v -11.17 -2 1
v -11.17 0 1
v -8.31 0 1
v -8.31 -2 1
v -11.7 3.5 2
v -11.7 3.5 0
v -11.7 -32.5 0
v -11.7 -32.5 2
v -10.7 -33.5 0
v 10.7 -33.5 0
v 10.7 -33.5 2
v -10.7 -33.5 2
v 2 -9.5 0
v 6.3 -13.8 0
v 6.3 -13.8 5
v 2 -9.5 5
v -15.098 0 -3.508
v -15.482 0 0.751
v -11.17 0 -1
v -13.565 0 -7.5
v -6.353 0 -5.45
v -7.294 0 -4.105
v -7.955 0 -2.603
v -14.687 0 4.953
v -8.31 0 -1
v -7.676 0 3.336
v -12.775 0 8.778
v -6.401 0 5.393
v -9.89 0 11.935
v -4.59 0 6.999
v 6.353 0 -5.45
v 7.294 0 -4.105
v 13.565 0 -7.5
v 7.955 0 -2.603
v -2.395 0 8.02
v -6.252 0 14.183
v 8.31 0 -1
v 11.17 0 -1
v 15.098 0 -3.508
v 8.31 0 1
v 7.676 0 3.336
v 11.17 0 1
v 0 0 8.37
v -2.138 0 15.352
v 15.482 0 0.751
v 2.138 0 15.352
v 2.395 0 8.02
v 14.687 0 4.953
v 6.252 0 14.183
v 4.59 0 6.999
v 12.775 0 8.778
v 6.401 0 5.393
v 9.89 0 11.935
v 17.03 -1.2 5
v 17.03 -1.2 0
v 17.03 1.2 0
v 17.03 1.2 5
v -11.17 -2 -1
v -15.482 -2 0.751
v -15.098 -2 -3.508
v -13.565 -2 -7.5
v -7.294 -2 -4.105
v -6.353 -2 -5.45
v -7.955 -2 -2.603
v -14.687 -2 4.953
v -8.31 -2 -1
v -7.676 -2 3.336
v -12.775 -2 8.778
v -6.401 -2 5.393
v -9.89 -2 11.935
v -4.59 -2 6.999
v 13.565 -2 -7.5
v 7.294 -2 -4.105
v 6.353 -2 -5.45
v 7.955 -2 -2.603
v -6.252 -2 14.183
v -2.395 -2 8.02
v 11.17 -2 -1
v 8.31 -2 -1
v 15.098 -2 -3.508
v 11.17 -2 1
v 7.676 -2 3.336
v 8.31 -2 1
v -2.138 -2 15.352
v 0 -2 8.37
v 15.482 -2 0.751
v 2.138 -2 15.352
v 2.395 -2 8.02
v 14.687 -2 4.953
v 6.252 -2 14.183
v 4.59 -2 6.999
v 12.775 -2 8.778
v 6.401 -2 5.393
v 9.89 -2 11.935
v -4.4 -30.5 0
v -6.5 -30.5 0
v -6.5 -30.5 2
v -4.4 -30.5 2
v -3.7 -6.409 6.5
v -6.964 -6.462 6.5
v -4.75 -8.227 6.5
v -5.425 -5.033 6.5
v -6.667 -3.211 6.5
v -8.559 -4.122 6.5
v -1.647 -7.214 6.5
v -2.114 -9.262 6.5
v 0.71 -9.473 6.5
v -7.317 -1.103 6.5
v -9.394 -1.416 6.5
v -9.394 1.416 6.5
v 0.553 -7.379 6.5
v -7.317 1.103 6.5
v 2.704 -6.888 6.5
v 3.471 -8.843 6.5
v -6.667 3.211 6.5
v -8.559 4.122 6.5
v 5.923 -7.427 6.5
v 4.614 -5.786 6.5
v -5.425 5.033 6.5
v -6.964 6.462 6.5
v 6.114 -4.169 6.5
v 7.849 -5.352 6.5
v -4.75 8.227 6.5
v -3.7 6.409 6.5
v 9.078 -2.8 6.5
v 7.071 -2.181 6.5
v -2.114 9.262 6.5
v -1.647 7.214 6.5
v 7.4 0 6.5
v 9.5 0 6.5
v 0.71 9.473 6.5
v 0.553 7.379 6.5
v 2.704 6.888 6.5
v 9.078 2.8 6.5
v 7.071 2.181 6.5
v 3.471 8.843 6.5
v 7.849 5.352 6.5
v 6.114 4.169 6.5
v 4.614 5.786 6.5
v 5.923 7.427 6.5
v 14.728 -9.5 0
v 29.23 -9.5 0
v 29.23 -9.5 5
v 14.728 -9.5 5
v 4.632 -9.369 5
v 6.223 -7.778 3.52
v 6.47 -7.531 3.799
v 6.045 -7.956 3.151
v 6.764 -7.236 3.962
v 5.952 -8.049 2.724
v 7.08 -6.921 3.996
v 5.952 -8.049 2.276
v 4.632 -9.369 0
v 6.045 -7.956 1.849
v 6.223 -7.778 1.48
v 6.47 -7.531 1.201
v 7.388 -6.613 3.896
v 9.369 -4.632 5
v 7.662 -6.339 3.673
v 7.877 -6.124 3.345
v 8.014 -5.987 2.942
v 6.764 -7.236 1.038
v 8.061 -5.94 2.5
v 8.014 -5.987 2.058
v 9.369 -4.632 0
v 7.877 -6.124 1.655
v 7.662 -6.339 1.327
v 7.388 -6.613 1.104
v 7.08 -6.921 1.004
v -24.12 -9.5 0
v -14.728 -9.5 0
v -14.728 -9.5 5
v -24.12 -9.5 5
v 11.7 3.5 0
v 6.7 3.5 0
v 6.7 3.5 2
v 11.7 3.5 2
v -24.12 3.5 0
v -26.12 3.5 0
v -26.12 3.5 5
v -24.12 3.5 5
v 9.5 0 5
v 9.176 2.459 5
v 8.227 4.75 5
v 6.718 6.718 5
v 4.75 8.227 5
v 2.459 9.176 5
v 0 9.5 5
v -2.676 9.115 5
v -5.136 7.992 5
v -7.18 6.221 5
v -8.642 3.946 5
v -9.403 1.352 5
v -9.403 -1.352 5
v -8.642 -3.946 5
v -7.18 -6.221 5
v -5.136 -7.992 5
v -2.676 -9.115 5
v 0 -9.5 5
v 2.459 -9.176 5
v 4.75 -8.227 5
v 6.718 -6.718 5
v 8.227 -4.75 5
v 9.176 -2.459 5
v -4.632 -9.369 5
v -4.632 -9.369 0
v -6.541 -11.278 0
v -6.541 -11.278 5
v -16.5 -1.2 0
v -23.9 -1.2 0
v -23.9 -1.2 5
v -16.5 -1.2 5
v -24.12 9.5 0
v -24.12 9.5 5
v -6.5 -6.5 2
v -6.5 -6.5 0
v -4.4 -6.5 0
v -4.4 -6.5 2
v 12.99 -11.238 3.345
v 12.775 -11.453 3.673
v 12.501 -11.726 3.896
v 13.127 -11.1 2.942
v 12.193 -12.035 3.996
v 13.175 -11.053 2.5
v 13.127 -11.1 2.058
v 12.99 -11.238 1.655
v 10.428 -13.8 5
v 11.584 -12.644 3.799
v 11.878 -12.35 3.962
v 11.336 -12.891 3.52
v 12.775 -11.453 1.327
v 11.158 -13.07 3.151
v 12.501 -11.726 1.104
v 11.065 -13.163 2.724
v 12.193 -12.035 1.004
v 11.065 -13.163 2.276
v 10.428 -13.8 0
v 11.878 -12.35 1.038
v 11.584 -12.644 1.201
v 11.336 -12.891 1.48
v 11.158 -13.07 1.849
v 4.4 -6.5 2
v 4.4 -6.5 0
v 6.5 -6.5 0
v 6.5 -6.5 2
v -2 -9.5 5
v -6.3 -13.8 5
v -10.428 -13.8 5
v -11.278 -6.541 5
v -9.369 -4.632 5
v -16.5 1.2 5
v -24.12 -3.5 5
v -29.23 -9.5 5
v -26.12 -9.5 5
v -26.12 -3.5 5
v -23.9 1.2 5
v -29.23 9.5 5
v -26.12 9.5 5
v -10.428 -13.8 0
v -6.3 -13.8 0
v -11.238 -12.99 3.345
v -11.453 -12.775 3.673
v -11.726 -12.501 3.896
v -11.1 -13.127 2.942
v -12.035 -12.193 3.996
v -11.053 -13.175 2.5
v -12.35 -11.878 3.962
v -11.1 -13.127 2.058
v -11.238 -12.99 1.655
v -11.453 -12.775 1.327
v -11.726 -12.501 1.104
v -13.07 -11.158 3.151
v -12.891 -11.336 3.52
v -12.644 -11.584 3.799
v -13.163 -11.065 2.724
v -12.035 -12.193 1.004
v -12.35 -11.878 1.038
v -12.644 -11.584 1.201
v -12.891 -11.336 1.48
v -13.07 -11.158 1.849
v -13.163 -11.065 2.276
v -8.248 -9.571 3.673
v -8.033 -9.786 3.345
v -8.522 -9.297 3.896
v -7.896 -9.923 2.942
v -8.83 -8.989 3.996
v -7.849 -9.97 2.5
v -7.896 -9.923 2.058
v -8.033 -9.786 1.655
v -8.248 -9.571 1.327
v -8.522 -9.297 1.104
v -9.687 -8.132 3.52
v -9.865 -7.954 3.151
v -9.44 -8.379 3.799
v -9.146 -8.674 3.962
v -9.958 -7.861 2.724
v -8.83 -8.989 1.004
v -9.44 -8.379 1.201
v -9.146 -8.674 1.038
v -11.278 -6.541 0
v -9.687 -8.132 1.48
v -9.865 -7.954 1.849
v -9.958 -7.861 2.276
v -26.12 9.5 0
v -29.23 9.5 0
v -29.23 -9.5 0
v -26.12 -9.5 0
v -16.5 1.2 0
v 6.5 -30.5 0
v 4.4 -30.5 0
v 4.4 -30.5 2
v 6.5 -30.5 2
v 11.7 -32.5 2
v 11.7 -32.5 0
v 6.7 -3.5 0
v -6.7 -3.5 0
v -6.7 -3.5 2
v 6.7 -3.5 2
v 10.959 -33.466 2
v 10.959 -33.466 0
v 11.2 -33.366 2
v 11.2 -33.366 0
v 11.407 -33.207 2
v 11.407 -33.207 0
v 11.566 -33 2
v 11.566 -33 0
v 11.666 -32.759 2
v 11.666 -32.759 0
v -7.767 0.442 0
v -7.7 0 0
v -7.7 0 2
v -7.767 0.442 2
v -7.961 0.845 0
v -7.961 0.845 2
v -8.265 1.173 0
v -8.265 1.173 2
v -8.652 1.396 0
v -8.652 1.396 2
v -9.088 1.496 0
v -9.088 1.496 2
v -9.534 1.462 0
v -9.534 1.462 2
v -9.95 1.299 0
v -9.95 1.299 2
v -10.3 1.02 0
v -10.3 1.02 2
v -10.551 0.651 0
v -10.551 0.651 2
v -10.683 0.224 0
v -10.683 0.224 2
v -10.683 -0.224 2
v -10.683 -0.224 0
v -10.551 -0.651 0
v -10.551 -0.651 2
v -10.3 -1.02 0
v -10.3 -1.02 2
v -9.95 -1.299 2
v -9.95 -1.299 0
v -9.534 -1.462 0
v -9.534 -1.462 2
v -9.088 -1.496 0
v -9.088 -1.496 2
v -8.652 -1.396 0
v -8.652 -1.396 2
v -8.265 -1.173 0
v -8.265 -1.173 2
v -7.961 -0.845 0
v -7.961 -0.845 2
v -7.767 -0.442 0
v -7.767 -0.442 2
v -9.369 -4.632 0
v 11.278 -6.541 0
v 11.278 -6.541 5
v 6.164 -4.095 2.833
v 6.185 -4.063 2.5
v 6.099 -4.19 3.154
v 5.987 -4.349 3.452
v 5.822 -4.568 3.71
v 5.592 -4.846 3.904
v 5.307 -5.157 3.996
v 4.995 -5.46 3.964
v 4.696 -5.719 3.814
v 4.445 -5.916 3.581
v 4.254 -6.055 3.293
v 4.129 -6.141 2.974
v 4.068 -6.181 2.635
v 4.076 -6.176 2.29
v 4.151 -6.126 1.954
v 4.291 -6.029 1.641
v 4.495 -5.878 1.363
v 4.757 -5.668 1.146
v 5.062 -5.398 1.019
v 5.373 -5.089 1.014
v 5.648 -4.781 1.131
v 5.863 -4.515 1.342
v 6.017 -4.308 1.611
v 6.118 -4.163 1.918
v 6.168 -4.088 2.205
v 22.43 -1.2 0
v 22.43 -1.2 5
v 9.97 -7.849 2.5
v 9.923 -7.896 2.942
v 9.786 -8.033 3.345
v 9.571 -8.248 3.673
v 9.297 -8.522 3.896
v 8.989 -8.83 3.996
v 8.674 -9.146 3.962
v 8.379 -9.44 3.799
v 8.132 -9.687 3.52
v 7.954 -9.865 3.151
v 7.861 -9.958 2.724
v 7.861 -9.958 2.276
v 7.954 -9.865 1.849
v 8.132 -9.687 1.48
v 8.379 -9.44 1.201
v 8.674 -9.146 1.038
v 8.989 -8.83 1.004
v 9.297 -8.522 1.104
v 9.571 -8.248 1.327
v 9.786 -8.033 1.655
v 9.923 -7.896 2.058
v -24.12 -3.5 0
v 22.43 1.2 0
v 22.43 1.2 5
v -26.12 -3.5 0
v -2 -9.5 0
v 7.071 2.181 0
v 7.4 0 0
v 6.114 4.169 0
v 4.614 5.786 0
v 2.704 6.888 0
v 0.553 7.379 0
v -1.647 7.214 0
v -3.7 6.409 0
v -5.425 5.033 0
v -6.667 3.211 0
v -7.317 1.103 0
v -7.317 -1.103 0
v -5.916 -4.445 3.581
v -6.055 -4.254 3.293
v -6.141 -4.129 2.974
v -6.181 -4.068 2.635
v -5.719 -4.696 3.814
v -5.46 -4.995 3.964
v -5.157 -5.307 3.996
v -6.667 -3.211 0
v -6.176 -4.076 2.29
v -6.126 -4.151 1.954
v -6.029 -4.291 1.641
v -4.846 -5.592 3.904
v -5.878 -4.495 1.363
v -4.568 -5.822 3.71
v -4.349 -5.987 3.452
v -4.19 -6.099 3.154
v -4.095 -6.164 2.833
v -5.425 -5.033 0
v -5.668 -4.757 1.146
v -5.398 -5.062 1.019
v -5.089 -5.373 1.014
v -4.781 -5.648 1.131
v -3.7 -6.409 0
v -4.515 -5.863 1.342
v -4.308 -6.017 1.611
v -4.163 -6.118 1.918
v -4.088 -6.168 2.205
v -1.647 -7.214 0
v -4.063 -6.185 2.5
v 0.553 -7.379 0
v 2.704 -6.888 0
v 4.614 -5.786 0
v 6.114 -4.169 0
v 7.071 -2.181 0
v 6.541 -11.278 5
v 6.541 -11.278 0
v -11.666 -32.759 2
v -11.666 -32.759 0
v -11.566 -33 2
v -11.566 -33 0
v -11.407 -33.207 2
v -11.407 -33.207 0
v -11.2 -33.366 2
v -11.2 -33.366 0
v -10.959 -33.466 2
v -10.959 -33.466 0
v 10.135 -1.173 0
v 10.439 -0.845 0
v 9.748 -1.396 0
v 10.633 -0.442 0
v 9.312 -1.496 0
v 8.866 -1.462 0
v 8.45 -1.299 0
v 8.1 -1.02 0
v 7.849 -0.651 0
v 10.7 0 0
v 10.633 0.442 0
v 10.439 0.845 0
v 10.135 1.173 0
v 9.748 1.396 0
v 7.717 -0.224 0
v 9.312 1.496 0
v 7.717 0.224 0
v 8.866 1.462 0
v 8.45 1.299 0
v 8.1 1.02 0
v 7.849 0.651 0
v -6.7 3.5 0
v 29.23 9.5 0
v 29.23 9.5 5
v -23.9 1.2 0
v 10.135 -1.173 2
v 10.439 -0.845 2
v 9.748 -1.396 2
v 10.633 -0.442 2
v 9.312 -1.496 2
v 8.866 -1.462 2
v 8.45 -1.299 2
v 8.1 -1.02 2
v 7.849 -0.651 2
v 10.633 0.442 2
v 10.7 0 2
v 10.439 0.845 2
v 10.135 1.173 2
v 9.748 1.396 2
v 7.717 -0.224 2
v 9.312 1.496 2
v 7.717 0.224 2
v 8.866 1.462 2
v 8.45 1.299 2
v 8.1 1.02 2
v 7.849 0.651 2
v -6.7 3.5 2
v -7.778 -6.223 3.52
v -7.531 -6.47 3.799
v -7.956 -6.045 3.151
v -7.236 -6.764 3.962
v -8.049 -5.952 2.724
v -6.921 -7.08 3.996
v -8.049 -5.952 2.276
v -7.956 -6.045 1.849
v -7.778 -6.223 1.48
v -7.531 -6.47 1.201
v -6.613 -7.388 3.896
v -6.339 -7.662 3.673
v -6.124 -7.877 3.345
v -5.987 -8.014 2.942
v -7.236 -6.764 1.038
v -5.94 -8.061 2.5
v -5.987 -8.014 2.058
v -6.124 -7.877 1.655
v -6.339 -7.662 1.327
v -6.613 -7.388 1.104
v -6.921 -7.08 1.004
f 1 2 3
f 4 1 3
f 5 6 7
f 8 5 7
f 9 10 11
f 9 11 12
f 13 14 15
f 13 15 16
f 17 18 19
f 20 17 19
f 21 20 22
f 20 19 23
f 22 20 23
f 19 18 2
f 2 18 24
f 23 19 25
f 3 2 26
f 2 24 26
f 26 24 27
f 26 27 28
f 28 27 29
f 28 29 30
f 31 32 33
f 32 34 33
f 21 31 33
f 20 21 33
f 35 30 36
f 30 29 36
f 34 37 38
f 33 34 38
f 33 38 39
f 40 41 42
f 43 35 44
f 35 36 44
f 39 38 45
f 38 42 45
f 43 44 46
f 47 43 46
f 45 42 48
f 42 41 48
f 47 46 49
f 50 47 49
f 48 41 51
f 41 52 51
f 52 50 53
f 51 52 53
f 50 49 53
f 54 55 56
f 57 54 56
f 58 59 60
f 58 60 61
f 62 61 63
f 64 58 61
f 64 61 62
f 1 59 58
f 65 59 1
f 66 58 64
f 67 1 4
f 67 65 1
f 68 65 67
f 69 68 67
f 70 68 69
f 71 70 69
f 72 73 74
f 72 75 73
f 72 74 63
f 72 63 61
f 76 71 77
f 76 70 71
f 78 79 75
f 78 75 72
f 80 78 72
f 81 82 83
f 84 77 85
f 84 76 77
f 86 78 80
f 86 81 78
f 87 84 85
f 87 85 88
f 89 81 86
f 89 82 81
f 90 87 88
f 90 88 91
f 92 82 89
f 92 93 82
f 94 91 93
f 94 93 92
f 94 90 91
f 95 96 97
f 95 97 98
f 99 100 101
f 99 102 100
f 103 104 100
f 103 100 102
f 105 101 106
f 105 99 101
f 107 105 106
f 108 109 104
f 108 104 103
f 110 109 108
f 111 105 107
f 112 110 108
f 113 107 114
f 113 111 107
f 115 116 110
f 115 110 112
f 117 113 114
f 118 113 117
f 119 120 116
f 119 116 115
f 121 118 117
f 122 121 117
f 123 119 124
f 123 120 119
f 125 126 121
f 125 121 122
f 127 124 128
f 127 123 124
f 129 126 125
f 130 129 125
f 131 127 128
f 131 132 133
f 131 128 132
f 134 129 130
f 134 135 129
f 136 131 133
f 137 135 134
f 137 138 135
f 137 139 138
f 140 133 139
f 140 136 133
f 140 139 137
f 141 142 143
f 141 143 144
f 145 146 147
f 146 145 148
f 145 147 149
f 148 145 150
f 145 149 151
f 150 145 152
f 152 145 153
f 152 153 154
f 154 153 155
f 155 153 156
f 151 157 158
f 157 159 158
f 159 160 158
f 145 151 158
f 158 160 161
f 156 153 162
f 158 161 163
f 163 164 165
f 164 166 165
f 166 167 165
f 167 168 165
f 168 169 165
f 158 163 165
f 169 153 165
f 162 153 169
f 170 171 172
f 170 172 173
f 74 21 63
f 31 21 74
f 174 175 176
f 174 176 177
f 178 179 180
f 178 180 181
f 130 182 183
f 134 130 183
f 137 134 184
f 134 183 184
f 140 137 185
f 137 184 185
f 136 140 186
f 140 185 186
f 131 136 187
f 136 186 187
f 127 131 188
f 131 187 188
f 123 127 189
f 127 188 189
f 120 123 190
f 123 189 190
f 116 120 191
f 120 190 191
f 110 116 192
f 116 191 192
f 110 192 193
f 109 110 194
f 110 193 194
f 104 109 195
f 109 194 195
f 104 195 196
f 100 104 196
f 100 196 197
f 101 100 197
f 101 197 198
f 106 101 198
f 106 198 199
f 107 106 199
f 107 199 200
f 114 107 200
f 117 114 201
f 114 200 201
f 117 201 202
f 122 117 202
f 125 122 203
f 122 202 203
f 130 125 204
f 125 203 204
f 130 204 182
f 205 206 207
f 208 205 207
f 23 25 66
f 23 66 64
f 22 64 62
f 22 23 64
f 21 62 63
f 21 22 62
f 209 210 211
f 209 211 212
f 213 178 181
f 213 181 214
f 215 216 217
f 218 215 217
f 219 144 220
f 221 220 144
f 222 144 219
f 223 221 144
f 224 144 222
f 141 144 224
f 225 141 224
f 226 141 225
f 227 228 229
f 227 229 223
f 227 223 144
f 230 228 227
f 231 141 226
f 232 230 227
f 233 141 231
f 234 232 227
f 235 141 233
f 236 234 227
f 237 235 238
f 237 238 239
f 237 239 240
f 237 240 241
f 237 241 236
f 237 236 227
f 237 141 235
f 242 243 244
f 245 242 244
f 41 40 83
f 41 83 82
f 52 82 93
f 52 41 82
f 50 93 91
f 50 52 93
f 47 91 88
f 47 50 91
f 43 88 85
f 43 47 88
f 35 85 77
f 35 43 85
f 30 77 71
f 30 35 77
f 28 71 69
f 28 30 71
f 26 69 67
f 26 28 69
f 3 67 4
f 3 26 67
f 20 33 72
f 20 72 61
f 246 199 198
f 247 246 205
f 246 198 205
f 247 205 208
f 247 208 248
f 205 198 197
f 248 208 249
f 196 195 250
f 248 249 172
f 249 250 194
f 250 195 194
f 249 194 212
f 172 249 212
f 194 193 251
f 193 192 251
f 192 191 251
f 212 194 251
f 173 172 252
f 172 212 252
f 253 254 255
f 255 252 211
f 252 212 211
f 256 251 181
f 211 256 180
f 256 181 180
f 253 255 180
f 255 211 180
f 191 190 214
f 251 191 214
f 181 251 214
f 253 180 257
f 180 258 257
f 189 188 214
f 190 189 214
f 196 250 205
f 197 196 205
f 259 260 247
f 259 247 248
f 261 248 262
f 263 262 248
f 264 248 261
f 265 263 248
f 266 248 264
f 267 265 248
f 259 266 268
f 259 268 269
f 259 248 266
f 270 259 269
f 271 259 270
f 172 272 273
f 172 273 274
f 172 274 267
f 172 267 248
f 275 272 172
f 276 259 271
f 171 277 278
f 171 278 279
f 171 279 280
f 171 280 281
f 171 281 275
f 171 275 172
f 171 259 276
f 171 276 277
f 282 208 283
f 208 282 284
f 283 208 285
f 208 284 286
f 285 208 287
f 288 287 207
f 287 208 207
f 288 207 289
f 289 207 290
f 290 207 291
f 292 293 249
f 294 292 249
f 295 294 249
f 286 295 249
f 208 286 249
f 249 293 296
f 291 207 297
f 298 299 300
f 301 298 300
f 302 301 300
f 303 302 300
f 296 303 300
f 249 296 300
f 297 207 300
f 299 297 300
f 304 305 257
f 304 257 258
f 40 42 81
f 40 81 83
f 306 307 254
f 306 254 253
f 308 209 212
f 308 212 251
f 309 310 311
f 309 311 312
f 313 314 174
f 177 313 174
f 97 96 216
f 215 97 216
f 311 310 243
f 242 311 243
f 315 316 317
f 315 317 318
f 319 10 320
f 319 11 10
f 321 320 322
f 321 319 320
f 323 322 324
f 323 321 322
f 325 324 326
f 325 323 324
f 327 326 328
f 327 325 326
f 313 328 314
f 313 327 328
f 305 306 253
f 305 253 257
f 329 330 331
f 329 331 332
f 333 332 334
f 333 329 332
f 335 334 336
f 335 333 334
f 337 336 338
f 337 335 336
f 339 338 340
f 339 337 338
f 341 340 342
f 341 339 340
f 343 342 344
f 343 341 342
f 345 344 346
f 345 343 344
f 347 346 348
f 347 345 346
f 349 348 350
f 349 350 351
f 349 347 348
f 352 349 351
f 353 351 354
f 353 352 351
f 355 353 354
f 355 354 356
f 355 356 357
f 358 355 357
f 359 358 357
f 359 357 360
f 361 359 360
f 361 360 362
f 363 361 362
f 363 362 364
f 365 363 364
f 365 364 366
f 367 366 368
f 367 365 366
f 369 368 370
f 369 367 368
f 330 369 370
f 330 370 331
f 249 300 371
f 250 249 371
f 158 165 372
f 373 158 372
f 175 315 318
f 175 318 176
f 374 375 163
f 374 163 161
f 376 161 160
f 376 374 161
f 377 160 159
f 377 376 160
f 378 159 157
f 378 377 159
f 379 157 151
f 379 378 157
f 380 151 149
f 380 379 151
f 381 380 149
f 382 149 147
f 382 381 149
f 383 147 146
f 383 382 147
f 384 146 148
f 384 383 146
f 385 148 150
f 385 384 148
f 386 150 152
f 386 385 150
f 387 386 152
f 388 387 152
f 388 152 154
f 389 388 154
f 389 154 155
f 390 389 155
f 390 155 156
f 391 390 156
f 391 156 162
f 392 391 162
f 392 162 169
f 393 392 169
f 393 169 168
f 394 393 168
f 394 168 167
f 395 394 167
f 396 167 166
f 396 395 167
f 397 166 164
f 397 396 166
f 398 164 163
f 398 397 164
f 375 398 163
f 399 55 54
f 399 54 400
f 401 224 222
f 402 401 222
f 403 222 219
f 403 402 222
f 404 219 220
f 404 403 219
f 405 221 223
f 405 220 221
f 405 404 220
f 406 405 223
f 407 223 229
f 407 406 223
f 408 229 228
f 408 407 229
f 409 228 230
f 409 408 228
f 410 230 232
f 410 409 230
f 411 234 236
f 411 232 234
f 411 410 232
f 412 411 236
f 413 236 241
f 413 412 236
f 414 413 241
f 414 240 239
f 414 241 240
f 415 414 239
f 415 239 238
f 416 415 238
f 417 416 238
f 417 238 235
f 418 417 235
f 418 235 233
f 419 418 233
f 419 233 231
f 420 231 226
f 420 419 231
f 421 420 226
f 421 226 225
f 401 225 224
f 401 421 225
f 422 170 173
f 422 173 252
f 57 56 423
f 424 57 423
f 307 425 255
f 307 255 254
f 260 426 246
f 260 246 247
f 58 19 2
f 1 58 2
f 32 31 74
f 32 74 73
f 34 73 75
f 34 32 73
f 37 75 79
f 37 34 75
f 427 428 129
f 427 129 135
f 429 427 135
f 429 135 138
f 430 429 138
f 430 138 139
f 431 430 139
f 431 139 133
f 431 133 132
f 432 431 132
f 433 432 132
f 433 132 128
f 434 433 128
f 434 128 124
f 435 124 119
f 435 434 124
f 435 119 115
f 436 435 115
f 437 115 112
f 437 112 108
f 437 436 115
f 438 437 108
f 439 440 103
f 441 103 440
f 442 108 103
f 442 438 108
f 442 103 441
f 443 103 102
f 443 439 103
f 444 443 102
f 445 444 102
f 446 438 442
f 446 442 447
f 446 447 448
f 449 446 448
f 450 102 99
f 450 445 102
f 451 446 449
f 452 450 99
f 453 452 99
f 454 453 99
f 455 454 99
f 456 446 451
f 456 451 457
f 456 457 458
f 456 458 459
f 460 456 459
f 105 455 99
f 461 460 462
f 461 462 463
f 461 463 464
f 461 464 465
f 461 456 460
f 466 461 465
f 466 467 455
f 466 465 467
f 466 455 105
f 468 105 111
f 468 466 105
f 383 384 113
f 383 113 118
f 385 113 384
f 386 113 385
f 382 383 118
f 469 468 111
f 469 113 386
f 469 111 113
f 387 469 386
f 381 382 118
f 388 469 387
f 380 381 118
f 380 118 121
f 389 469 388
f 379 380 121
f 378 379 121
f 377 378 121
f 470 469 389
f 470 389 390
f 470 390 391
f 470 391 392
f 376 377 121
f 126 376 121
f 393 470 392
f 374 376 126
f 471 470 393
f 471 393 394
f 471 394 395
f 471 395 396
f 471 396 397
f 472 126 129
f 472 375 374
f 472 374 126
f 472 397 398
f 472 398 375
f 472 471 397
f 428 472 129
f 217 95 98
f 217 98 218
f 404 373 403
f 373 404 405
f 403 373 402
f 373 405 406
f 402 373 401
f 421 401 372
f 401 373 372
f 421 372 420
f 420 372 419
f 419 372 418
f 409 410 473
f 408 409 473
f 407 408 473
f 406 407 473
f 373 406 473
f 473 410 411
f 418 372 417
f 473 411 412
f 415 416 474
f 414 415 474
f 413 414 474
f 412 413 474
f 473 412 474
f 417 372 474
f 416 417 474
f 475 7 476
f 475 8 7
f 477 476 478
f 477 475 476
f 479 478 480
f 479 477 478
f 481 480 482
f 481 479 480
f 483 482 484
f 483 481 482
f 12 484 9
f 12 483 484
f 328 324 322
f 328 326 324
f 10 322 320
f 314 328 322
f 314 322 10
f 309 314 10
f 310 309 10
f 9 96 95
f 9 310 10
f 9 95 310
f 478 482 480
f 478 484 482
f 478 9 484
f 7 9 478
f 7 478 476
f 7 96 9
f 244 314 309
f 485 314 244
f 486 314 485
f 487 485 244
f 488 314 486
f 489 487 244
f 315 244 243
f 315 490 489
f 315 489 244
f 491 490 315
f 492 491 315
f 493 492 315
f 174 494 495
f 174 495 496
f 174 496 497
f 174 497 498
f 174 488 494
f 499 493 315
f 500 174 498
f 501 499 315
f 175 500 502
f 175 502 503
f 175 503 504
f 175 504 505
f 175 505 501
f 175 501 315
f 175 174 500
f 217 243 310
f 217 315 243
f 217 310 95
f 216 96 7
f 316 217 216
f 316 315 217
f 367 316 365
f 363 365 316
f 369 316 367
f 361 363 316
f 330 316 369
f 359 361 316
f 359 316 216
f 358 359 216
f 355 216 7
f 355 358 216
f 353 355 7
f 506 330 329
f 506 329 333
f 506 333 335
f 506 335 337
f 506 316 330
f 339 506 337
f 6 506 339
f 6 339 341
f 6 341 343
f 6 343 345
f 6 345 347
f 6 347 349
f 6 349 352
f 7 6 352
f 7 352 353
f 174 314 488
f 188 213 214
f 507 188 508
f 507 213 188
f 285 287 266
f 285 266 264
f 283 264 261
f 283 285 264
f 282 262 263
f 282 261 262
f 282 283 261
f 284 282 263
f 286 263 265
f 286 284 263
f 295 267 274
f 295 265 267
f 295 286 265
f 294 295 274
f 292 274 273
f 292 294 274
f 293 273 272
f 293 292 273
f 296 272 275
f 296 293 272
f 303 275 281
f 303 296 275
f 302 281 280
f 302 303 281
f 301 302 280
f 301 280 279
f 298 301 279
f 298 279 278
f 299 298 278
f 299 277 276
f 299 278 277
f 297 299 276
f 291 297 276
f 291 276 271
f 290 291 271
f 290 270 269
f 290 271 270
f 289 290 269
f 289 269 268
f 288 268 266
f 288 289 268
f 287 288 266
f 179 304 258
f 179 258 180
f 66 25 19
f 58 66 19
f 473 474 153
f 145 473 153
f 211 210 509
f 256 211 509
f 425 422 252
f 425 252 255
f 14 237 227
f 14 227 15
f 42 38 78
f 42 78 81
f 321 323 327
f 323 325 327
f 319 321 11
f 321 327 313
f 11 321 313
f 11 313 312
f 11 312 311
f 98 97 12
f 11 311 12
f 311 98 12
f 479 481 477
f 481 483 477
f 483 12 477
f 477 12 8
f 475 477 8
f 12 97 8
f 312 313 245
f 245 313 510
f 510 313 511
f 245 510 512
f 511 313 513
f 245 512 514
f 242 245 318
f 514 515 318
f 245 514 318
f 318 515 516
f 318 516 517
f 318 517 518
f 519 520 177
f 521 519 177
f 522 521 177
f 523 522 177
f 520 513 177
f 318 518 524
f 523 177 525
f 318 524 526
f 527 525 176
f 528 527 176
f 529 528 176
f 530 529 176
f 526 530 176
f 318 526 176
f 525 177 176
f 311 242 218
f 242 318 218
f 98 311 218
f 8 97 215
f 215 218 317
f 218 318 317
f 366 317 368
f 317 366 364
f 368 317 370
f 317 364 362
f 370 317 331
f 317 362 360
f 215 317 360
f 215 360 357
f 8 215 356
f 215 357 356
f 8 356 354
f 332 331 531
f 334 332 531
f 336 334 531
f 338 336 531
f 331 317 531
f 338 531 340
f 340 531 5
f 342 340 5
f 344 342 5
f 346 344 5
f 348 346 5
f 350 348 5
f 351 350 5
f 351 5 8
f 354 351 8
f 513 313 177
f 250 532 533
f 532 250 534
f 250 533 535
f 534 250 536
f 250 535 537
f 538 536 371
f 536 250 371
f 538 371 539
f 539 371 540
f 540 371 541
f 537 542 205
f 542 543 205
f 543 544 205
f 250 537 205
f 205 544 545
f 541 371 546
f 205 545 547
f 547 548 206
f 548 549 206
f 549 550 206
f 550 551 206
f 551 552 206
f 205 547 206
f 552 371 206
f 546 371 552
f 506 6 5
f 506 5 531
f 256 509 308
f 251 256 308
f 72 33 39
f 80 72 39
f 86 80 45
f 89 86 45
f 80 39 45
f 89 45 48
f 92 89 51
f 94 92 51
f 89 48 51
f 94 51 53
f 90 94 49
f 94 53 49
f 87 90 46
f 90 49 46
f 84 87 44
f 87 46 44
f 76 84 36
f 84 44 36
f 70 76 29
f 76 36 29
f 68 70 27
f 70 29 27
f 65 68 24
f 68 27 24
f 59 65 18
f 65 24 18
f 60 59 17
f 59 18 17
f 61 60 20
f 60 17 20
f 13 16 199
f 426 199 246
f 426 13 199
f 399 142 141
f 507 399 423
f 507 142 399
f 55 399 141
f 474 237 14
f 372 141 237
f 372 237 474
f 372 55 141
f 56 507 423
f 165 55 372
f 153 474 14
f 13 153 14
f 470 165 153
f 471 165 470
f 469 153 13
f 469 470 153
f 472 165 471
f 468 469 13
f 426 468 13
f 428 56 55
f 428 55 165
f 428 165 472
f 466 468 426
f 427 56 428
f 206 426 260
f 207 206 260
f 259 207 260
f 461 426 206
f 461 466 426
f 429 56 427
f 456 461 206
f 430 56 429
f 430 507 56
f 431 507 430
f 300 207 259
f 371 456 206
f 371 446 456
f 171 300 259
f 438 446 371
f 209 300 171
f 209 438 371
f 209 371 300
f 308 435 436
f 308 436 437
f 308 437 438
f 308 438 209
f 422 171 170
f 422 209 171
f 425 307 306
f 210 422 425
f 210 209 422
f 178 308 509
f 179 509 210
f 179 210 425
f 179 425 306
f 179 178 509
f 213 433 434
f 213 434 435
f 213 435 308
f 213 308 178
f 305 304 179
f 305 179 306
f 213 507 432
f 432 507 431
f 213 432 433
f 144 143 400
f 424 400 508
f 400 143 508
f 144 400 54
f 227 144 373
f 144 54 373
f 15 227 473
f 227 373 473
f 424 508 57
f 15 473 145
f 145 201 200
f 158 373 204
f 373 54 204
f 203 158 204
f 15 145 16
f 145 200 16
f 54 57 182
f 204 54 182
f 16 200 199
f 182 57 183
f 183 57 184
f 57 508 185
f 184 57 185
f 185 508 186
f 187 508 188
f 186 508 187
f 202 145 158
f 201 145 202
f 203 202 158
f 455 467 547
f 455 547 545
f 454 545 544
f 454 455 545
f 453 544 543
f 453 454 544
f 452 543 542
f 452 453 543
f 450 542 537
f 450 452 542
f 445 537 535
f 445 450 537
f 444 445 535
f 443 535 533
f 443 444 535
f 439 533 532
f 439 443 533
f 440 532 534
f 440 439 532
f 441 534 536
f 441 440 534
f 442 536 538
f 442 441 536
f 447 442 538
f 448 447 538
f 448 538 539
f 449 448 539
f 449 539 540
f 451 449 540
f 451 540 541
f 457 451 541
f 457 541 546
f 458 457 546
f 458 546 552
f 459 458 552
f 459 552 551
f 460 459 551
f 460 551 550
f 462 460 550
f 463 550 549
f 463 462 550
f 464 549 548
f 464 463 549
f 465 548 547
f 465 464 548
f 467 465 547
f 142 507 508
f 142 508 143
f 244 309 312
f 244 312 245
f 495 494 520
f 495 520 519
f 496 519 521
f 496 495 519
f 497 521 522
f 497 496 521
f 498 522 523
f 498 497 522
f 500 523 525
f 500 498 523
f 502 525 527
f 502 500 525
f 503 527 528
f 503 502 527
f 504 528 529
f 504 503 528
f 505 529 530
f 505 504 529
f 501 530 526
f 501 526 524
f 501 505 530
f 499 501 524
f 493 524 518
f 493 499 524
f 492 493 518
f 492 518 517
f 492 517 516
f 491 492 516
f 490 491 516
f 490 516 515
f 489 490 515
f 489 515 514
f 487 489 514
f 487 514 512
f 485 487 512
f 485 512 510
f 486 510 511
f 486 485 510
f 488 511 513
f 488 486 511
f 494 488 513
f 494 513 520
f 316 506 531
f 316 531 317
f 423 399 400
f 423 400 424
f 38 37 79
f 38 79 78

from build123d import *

# Parameters (mm, degrees)
SKETCH_R           = 1.5
SKETCH_W           = 2.1
SKETCH_H           = 24
PAD_DEPTH          = 2
FILLET_R           = 1
SKETCH001_R        = 7.4
SKETCH001_W        = 5.4
SKETCH001_H        = 2.4
SKETCH001_W_2      = 7.4
PAD001_DEPTH       = 5
SKETCH002_R        = 9.5
SKETCH002_R_2      = 7.4
PAD002_DEPTH       = 6.5
SKETCH003_R        = 1.5
POCKET_DEPTH       = 156.961778
POLARPATTERN_COUNT = 2
POLARPATTERN_ANGLE = 90
SKETCH004_R        = 1.05
POCKET001_DEPTH    = 15
PAD003_DEPTH       = 2


with BuildPart() as holder_optostop:
    # Sketch → Pad (new body)
    with BuildSketch(Plane.XY):
        Polygon((-11.7, 3.5), (-6.7, 3.5), (-6.7, -3.5), (6.7, -3.5), (6.7, 3.5), (11.7, 3.5), (11.7, -3.5), (11.7, -33.5), (-11.7, -33.5), (-11.7, -3.5), align=None)
        with Locations((-9.2, 0)):
            Circle(SKETCH_R, mode=Mode.SUBTRACT)
        with Locations((9.2, 0)):
            Circle(SKETCH_R, mode=Mode.SUBTRACT)
        with Locations((-5.45, -18.5)):
            Rectangle(SKETCH_W, SKETCH_H, mode=Mode.SUBTRACT)
        with Locations((5.45, -18.5)):
            Rectangle(SKETCH_W, SKETCH_H, mode=Mode.SUBTRACT)
    extrude(amount=PAD_DEPTH)

    # Fillet
    fillet_edges = [holder_optostop.edges().sort_by_distance(p)[0] for p in [
        (-11.7, -33.5, 1),
        (11.7, -33.5, 1),
    ]]
    fillet(fillet_edges, radius=FILLET_R)


with BuildPart() as gilson_probe_fastener:
    # Sketch001 → Pad001 (new body)
    with BuildSketch(Plane.XY):
        Polygon((29.23, 9.5), (29.23, -9.5), (14.727922, -9.5), (10.427922, -13.8), (6.3, -13.8), (2, -9.5), (-2, -9.5), (-6.3, -13.8), (-10.427922, -13.8), (-14.727922, -9.5), (-24.12, -9.5), (-24.12, -3.5), (-26.12, -3.5), (-26.12, -9.5), (-29.23, -9.5), (-29.23, 9.5), (-26.12, 9.5), (-26.12, 3.5), (-24.12, 3.5), (-24.12, 9.5), align=None)
        Circle(SKETCH001_R, mode=Mode.SUBTRACT)
        Polygon((4.631549, -9.369165), (9.369165, -4.631549), (11.278353, -6.540738), (6.540738, -11.278353), align=None, mode=Mode.SUBTRACT)
        Polygon((-9.369165, -4.631549), (-4.631549, -9.369165), (-6.540738, -11.278353), (-11.278353, -6.540738), align=None, mode=Mode.SUBTRACT)
        with Locations((19.73, 0)):
            Rectangle(SKETCH001_W, SKETCH001_H, mode=Mode.SUBTRACT)
        with Locations((-20.2, 0)):
            Rectangle(SKETCH001_W_2, SKETCH001_H, mode=Mode.SUBTRACT)
    extrude(amount=PAD001_DEPTH)

    # Sketch002 → Pad002 (join)
    with BuildSketch(Plane.XY):
        Circle(SKETCH002_R)
        Circle(SKETCH002_R_2, mode=Mode.SUBTRACT)
    extrude(amount=PAD002_DEPTH)

    # Sketch003 → Pocket (cut, through all)
    with BuildSketch(Plane(origin=(0, 0, 0), x_dir=(0.707107, 0.707107, 0), z_dir=(0.707107, -0.707107, 0))):
        with Locations((0, 2.5)):
            Circle(SKETCH003_R)
    pocket = extrude(amount=POCKET_DEPTH, mode=Mode.SUBTRACT)

    # PolarPattern: Pocket ×2 about axis
    polarpattern_axis = Axis((0, 0, 0), (0, 0, -1))
    for i in range(1, POLARPATTERN_COUNT):
        add(pocket.rotate(polarpattern_axis, i * POLARPATTERN_ANGLE / (POLARPATTERN_COUNT - 1)), mode=Mode.SUBTRACT)

    # Sketch004 → Pocket001 (cut)
    with BuildSketch(Plane.YZ.offset(-30)):
        with Locations((-11.65, 2.5)):
            Circle(SKETCH004_R)
        with Locations((11.65, 2.5)):
            Circle(SKETCH004_R)
    extrude(amount=POCKET001_DEPTH, mode=Mode.SUBTRACT)


with BuildPart() as probe_holder_rings:
    # Sketch005 → Pad003 (new body)
    with BuildSketch(Plane.XZ):
        with BuildLine():
            ThreePointArc((13.56466, -7.5), (0, 15.5), (-13.56466, -7.5))
            Line((13.56466, -7.5), (-13.56466, -7.5))
        make_face()
        with BuildLine():
            ThreePointArc((8.310048, 1), (0, 8.37), (-8.310048, 1))
            Line((-11.17, 1), (-8.310048, 1))
            Line((-11.17, -1), (-11.17, 1))
            Line((-8.310048, -1), (-11.17, -1))
            ThreePointArc((-8.310048, -1), (-7.661481, -3.370254), (-6.352511, -5.45))
            Line((-6.352511, -5.45), (6.352511, -5.45))
            ThreePointArc((6.352511, -5.45), (7.661481, -3.370254), (8.310048, -1))
            Line((8.310048, -1), (11.17, -1))
            Line((11.17, -1), (11.17, 1))
            Line((11.17, 1), (8.310048, 1))
        make_face(mode=Mode.SUBTRACT)
    extrude(amount=PAD003_DEPTH)


solid = Compound([holder_optostop.part, gilson_probe_fastener.part, probe_holder_rings.part])
